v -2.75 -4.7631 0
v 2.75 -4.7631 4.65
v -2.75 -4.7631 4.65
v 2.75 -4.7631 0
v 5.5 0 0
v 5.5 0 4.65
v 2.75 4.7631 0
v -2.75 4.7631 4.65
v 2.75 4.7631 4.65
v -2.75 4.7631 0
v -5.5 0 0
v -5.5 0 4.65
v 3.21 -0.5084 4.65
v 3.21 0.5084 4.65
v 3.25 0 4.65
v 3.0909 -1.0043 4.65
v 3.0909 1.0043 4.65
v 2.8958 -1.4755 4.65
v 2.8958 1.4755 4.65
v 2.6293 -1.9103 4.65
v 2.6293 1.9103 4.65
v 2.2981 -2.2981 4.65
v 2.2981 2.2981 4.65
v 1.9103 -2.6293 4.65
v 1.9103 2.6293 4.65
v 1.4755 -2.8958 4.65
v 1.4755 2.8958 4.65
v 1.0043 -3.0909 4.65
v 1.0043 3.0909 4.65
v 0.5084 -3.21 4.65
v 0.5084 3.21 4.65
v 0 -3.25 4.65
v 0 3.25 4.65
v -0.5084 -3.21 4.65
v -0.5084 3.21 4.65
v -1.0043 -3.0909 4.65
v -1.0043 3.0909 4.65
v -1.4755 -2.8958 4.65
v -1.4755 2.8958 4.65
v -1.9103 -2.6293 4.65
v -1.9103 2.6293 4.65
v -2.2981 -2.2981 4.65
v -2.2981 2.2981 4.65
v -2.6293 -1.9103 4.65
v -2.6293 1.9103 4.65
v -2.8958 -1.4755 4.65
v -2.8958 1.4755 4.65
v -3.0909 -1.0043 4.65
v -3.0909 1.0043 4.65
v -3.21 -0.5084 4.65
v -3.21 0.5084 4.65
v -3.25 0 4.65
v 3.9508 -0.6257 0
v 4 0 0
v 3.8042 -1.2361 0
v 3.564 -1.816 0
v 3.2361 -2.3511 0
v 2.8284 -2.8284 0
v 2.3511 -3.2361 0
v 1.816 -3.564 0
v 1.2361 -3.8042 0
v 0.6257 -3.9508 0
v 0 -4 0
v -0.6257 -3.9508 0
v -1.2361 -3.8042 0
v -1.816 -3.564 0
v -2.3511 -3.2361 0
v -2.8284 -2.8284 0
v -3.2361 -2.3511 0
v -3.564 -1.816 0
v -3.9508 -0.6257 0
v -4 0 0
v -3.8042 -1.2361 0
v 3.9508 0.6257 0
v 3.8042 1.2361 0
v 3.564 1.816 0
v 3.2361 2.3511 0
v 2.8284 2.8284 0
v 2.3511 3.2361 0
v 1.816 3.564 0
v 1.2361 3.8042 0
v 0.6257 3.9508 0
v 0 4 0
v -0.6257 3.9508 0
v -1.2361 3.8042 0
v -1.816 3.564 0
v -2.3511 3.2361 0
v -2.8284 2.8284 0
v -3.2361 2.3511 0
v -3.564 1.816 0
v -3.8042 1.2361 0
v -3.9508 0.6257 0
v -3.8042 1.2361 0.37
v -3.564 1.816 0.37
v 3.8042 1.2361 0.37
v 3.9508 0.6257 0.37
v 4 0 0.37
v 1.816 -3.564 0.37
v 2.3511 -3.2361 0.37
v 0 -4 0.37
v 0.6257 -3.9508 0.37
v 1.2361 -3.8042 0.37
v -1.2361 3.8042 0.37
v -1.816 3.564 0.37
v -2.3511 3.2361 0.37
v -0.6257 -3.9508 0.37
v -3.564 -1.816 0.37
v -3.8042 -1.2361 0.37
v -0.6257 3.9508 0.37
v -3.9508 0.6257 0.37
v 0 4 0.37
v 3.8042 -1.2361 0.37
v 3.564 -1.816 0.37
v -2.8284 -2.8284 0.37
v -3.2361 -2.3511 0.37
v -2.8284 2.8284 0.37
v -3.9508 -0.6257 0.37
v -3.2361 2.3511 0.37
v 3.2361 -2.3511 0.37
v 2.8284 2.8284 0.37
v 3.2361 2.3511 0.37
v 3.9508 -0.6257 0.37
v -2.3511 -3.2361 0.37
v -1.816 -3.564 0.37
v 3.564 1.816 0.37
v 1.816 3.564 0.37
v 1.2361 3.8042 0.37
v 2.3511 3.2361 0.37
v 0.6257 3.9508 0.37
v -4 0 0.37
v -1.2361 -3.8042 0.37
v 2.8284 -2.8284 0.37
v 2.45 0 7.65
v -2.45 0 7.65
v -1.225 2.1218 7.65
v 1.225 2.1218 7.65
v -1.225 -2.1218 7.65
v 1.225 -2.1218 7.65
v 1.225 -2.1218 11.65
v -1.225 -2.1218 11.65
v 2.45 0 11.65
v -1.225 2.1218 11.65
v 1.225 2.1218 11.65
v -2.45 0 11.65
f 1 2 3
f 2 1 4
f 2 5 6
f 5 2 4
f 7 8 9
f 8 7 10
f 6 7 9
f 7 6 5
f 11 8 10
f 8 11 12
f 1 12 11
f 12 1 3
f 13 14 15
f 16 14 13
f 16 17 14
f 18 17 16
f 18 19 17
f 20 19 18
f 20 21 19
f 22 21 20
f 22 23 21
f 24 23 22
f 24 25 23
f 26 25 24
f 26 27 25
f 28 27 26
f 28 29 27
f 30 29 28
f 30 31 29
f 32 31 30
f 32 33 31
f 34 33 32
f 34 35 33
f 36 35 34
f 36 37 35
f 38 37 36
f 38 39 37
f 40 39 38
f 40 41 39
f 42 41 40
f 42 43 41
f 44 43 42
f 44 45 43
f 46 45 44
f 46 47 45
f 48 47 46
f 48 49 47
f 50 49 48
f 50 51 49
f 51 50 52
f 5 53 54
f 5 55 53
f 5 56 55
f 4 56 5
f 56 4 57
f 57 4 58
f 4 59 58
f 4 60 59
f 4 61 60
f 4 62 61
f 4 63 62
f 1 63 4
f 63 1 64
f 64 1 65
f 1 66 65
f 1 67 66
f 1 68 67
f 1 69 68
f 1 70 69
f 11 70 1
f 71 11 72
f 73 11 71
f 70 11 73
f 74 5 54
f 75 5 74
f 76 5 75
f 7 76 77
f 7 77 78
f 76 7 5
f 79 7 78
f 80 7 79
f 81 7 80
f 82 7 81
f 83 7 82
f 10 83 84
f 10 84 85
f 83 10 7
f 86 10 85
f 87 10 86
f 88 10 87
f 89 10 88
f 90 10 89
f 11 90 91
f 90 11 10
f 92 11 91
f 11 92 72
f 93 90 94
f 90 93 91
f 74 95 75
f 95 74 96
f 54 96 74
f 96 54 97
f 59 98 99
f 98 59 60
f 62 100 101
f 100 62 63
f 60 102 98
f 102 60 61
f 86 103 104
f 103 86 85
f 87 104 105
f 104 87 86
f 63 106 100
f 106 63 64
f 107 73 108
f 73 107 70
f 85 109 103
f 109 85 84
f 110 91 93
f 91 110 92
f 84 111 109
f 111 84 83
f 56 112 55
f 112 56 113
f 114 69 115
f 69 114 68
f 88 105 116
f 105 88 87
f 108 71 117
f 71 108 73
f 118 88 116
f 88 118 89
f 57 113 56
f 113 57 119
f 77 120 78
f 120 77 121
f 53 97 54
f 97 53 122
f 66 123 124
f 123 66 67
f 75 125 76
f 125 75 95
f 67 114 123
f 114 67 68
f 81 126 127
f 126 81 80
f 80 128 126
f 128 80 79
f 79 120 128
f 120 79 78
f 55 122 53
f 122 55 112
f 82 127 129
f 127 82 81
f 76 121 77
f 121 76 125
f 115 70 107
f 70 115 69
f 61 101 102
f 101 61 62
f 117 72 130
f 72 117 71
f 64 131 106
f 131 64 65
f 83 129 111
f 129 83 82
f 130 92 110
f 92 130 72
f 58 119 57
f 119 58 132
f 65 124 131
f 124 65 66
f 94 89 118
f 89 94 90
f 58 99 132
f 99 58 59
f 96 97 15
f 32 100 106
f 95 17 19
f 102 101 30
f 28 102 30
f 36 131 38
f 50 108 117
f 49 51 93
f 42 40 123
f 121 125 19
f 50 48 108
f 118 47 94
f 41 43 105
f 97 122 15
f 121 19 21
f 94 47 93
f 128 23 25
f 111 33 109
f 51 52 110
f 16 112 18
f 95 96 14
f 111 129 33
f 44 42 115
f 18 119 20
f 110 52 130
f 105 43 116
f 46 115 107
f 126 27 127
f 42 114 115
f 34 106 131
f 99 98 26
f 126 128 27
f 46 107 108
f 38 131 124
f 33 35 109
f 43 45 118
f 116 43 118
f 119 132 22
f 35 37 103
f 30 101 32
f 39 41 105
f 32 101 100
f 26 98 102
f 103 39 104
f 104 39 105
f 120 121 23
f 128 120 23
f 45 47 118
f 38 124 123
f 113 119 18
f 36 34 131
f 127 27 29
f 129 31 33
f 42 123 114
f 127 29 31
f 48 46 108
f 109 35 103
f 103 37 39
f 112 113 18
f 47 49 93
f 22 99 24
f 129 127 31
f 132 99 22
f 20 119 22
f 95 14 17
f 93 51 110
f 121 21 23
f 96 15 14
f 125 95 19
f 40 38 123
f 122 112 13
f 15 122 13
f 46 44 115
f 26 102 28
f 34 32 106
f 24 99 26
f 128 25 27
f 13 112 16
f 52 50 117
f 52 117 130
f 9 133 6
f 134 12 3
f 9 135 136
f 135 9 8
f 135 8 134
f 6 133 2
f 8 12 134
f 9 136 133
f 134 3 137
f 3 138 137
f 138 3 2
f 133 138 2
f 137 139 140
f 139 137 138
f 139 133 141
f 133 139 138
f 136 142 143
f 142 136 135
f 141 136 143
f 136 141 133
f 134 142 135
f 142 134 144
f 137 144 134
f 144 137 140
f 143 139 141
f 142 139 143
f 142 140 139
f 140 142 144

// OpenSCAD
// Anton Bilbaeno
// 4     b11b4
// github: 4b11b4
// thingiverse: 4b11b4
// www.4b11b4.com
// 1/30/2019



// A model for a 3D printed drill bit designed to tighten 3.5mm
// knurled nuts. These are common in Eurorack synthesizer modules.

// This drill bit is unique in that most designs feature "nubs" to
// fit into two "slots" on these knurled nuts. This design completely
// ignores those "slots". Instead, the inside of the "grip" is a cone
// shape. In other words, the cutout is a cylinder with a decreasing
// diameter as it goes up.

// Instead of having "nubs" which fit into the "slots" of the knurled
// nut, this "grip" simply uses friction. A small amount of downward
// force is required. This does cause the "grip" to wear out over time.
// However, as you wear out one layer (i.e. each "layer" created by the
// 3D printer), the layer above it will begin to grip the knurled nut.

// With the proper driver, the bit can be used to tighten knurled
// nuts to an appropriate level of torque.

// It may be possible to design some even more complex structures
// inside the bit, so that as you wear out one layer, you will reach
// a completely new grip. This would eventually require removing
// some of the face of the bit (i.e. sanding down the front).



// While tweaking the variables below, it is helpful to see the inside of
// the bit. You will find a helpful comment in the grip() definition below.



// REAL-WORLD MEASUREMENTS USING METAL CALIPERS
// If default .STL files do not work, try check these measurements.
KNURL_D_MEASURE = 7.70; //measured outer diameter of a knurled nut
KNURL_H_MEASURE = 1.87; //height of a knurled nut
THREAD_H_MEASURE = 4.65; //height of threads on jack
BIT_D_MEASURE = 4.50; //common drill bit sizes: 4.5, 6mm

// PRINTER TWEAKS (you may experiment with)
// Depending on your filament size, layer heights, print temperature, etc
// you may find slightly better results by tweaking these.
KNURL_R_TWEAK = 0.150 ; //increase if nut does not fit
KNURL_H_TWEAK = 1.50; //reduce height of lip at end of bit, max=KNURL_H_MEASURE
BIT_R_TWEAK   = 0.200; //increase if shaft does not fit snugly
GRIP_H_TWEAK = 0.00; //increase if bit bottoms out. knurl_h is 1.87mm, so THREAD_H_MEASURE should be an extra 1.87mm too big already...? assuming the "grip" area is hitting the jack at the top

// VARIABLES SETUP (you may change)
GRIP_SHELL = 1.50; //thickness outside wall <-> grip cutout
GRIP_R_CHANGE = 0.750; //how much the grip radius decreases
SHAFT_HEIGHT            = 4;   //shaft is inserted into drill chuck
TRANSFER_HEIGHT         = 3;   //"transfer" is between the bit and shaft
OUTER_NUM_ANGLES        = 6;   //usually bits are a hexagon...
GRIP_NUM_ANGLES         = 40;  //the number of "teeth"  

// FINAL VARIABLE SETUP (do not change)
KNURL_RADIUS        = KNURL_D_MEASURE/2 + KNURL_R_TWEAK;
KNURL_H        = KNURL_H_MEASURE - KNURL_H_TWEAK;
GRIP_INNER_RADIUS   = KNURL_RADIUS - GRIP_R_CHANGE;
GRIP_HEIGHT         = THREAD_H_MEASURE + GRIP_H_TWEAK;   //size of inside cone
BIT_RADIUS          = BIT_D_MEASURE/2 + BIT_R_TWEAK;
OUTER_RADIUS        = KNURL_RADIUS + GRIP_SHELL;



union() {
  grip();
  transfer();
  shaft();
};

module grip() {
  difference() {
    cylinder(r=OUTER_RADIUS,h=GRIP_HEIGHT,$fn=OUTER_NUM_ANGLES); //outside cylinder solid
    cylinder(r=KNURL_RADIUS,h=KNURL_H,$fn=GRIP_NUM_ANGLES); //KNURL_H ("lip") cylinder cutout
    translate([0,0,KNURL_H]) //cone cutout "cylinder with decreasing radius"
      cylinder(r1=KNURL_RADIUS,r2=GRIP_INNER_RADIUS,h=GRIP_HEIGHT-KNURL_H,$fn=GRIP_NUM_ANGLES);
    /////// UNCONMMENT TO VIEW CROSS-SECTION OF BIT
    //translate([0,-500,-100]) cube(1000,1000,1000);
    ///////
  }
}

module transfer() {
  translate([0,0,GRIP_HEIGHT])
    cylinder(r1=OUTER_RADIUS,r2=BIT_RADIUS,h=TRANSFER_HEIGHT,$fn=OUTER_NUM_ANGLES);
}

module shaft() {
  translate([0,0,GRIP_HEIGHT+TRANSFER_HEIGHT])
    cylinder(r=BIT_RADIUS,h=SHAFT_HEIGHT,$fn=OUTER_NUM_ANGLES);
}
